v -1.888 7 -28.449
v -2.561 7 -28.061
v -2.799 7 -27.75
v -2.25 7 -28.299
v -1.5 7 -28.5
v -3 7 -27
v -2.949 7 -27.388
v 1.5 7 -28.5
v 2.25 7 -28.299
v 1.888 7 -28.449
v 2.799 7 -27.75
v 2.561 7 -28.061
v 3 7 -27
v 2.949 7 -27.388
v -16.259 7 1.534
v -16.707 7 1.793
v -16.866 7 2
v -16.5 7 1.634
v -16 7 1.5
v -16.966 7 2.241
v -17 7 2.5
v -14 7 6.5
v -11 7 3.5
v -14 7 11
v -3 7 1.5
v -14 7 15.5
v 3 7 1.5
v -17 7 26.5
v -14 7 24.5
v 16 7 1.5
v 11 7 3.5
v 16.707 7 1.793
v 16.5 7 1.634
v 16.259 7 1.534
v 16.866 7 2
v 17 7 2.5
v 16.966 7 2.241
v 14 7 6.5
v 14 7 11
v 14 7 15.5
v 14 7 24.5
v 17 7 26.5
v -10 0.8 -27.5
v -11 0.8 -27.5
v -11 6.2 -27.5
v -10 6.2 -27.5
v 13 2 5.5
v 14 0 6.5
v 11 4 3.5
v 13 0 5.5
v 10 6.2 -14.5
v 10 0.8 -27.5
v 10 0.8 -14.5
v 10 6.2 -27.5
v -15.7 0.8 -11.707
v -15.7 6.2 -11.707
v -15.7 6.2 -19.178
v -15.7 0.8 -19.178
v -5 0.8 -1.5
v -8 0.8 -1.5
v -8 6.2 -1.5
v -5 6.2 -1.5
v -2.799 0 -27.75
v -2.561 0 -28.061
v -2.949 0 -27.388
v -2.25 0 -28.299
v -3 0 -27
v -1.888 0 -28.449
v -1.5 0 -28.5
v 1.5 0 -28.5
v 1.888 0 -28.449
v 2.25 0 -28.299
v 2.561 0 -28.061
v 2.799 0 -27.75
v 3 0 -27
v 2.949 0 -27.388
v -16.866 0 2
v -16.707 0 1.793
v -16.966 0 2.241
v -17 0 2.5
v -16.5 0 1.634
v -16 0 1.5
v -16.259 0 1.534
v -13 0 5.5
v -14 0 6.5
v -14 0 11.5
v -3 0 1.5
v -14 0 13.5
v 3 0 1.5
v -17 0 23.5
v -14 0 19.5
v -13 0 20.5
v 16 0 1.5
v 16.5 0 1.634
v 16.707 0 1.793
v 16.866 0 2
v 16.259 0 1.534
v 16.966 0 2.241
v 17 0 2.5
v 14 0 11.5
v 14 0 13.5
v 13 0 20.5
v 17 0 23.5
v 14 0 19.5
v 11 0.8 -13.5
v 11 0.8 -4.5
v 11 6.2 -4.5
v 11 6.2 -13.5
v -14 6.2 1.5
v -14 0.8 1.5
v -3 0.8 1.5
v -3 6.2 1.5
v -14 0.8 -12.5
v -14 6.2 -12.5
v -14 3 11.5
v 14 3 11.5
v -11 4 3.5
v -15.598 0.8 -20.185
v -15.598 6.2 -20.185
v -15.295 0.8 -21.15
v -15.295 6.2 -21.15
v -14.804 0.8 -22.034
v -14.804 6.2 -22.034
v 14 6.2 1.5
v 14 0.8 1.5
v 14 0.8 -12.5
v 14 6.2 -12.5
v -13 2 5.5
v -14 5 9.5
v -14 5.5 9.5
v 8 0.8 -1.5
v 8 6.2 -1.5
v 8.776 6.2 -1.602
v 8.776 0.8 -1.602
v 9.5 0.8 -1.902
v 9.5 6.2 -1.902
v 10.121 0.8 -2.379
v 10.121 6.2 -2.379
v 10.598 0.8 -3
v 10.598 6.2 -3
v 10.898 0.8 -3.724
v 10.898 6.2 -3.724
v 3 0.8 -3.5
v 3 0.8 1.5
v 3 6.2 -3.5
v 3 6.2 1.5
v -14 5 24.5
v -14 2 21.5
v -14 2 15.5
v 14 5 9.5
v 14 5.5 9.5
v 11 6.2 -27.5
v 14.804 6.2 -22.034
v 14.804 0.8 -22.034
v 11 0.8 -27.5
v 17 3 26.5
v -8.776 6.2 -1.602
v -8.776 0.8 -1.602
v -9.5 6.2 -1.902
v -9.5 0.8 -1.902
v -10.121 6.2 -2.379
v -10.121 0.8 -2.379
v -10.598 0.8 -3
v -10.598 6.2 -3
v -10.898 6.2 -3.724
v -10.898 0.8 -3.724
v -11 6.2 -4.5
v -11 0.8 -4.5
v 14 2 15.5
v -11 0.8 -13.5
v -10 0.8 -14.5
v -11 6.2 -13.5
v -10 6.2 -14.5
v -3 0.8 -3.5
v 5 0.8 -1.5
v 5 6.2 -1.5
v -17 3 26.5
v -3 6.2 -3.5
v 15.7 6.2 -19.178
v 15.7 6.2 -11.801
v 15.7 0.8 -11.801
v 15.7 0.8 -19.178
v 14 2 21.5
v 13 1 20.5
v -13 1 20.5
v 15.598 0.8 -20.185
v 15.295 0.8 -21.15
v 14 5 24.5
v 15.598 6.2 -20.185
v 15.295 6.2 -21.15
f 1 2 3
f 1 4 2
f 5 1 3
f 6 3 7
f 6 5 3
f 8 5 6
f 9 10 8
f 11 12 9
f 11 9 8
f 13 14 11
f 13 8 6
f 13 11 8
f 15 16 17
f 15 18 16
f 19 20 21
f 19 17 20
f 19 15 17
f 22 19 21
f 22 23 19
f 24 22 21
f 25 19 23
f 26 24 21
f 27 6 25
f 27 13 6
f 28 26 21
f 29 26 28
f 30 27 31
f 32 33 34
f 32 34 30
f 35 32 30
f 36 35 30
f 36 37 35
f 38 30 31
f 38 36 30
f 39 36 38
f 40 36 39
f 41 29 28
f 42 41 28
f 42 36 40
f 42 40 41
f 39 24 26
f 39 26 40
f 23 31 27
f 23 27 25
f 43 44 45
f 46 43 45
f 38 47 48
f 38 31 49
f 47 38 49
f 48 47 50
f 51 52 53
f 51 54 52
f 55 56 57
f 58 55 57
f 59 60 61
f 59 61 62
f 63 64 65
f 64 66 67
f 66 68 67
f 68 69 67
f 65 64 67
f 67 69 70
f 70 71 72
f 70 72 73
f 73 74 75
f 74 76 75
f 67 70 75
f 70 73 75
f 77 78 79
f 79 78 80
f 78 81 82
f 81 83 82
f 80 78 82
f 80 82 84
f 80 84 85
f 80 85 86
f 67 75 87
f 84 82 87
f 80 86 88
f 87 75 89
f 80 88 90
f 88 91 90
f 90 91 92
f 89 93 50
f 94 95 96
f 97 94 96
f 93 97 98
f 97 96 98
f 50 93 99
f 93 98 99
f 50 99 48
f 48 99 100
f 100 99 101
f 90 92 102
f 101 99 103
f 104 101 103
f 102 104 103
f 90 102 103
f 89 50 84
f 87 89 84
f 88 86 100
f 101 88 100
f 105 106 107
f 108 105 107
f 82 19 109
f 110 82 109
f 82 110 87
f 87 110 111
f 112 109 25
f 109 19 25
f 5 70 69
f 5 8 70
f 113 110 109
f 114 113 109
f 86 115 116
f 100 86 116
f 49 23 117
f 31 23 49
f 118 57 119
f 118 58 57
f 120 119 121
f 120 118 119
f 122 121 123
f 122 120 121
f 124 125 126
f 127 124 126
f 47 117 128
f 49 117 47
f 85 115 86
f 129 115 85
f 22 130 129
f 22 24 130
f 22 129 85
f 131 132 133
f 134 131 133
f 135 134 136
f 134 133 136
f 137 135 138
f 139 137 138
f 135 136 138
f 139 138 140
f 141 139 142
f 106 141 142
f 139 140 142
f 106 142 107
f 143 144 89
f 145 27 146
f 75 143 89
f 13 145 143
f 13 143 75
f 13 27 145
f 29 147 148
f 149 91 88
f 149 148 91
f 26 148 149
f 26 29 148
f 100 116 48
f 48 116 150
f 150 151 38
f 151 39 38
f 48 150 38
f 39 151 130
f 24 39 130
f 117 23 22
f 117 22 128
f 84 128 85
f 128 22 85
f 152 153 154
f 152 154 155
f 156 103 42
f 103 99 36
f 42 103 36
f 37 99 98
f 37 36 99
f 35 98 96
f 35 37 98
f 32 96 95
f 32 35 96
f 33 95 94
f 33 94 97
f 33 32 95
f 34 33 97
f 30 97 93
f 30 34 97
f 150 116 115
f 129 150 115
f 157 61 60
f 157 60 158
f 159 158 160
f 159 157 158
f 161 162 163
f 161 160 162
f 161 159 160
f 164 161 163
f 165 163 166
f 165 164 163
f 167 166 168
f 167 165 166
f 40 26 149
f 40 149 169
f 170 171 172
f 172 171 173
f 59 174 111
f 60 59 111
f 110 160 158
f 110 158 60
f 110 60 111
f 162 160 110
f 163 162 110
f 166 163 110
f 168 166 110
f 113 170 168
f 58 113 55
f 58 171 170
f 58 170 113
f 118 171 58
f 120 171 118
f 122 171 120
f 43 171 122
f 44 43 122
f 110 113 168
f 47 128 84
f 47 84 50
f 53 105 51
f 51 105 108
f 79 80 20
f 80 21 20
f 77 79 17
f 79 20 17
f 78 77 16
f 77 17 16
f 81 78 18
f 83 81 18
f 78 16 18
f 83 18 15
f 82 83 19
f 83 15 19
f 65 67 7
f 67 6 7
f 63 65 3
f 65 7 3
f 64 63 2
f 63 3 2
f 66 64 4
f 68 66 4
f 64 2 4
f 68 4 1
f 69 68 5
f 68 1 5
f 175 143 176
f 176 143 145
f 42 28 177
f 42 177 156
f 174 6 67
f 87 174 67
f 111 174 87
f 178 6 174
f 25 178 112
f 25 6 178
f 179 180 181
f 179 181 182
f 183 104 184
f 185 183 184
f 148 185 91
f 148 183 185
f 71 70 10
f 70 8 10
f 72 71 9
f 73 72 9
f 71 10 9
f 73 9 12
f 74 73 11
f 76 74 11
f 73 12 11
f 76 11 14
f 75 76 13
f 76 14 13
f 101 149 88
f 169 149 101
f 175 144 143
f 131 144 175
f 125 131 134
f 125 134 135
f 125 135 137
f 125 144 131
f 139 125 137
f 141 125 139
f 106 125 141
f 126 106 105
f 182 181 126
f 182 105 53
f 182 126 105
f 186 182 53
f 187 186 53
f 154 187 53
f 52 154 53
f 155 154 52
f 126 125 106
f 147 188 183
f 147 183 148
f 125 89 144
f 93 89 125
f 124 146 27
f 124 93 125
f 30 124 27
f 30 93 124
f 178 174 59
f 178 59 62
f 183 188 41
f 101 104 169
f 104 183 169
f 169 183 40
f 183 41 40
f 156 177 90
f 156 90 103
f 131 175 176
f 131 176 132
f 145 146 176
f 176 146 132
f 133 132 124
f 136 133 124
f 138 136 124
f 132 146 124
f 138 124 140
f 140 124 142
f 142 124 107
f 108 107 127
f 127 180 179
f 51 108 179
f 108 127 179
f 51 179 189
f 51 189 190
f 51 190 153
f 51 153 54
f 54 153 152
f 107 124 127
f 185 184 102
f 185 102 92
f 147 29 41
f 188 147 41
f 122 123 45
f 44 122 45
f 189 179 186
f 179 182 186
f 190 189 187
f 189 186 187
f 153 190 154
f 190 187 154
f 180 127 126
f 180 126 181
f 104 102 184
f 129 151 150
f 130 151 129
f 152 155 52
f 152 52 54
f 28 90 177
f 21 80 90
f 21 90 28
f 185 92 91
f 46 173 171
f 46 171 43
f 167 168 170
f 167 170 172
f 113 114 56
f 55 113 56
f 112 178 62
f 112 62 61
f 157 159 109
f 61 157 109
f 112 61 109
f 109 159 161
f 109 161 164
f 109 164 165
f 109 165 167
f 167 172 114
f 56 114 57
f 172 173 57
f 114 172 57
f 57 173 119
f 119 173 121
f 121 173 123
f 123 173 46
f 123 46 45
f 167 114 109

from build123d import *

# Parameters (mm, degrees)
SKETCH1_W            = 28
SKETCH1_H            = 3
BOSS_EXTRUDE1_DEPTH  = 7
SKETCH2_W            = 3
SKETCH2_H            = 7
BOSS_EXTRUDE2_DEPTH  = 26
SKETCH3_W            = 6
SKETCH3_H            = 7
BOSS_EXTRUDE3_DEPTH  = 27
BOSS_EXTRUDE4_DEPTH  = 7
CHAMFER1_SIZE        = 2
FILLET1_R            = 3
CUT_EXTRUDE1_DEPTH   = 8
SKETCH6_W            = 34
SKETCH6_H            = 7
BOSS_EXTRUDE5_DEPTH  = 25
SKETCH8_W            = 28
SKETCH8_H            = 21
CUT_EXTRUDE2_DEPTH   = 25
CHAMFER2_SIZE        = 3
FILLET2_R            = 1
SKETCH9_W            = 28
SKETCH9_H            = 4
BOSS_EXTRUDE6_DEPTH  = 7
SKETCH10_W           = 28
SKETCH10_H           = 2
BOSS_EXTRUDE7_DEPTH  = 4
CHAMFER3_SIZE        = 1
CHAMFER4_SIZE        = 3
CHAMFER5_SIZE        = 2
FILLET4_R            = 1.5
SKETCH11_W           = 14
SKETCH11_H           = 7
BOSS_EXTRUDE8_DEPTH  = 1
CHAMFER6_SIZE        = 1
SKETCH12_W           = 14
SKETCH12_H           = 7
BOSS_EXTRUDE9_DEPTH  = 1
CHAMFER7_SIZE        = 1
SKETCH13_W           = 30
SKETCH13_H           = 0.8
CUT_EXTRUDE3_DEPTH   = 12.7
SKETCH14_W           = 30
SKETCH14_H           = 0.8
CUT_EXTRUDE4_DEPTH   = 12.7
BOSS_EXTRUDE10_DEPTH = 5.4
FILLET5_R            = 5
CHAMFER8_SIZE        = 3
SKETCH16_W           = 28
SKETCH16_H           = 2
BOSS_EXTRUDE11_DEPTH = 2
CHAMFER9_SIZE        = 2
SKETCH17_W           = 30.68644474
SKETCH17_H           = 2
BOSS_EXTRUDE12_DEPTH = 2
CHAMFER10_SIZE       = 2
CHAMFER11_SIZE       = 1.5
CHAMFER12_SIZE       = 1


with BuildPart() as part:
    # Sketch1 → Boss-Extrude1 (new body)
    with BuildSketch(Plane(origin=(0, 0, 0), x_dir=(1, 0, 0), z_dir=(0, 1, 0))):
        Rectangle(SKETCH1_W, SKETCH1_H)
    extrude(amount=BOSS_EXTRUDE1_DEPTH)

    # Sketch2 → Boss-Extrude2 (add)
    with BuildSketch(Plane(origin=(0, 0, -1.5), x_dir=(-1, 0, 0), z_dir=(0, 0, -1))):
        with Locations((12.5, 3.5)):
            Rectangle(SKETCH2_W, SKETCH2_H)
        with Locations((-12.5, 3.5)):
            Rectangle(SKETCH2_W, SKETCH2_H)
    extrude(amount=BOSS_EXTRUDE2_DEPTH)

    # Sketch3 → Boss-Extrude3 (add)
    with BuildSketch(Plane(origin=(0, 0, -1.5), x_dir=(-1, 0, 0), z_dir=(0, 0, -1))):
        with Locations((0, 3.5)):
            Rectangle(SKETCH3_W, SKETCH3_H)
    extrude(amount=BOSS_EXTRUDE3_DEPTH)

    # Sketch4 → Boss-Extrude4 (add)
    with BuildSketch(Plane(origin=(0, 7, 0), x_dir=(1, 0, 0), z_dir=(0, 1, 0))):
        Polygon((-14, 12.5), (-15.7, 11.707276981), (-15.7, 16.707276981), (-14, 19.5), align=None)
        Polygon((14, 12.5), (15.7, 11.800538513), (15.7, 16.800538513), (14, 19.5), align=None)
    extrude(amount=-BOSS_EXTRUDE4_DEPTH)

    # Chamfer1
    chamfer1_edges = [part.edges().sort_by_distance(p)[0] for p in [
        (3, 3.5, -1.5),
        (-3, 3.5, -1.5),
    ]]
    chamfer(chamfer1_edges, length=CHAMFER1_SIZE)

    # Fillet1
    fillet1_edges = [part.edges().sort_by_distance(p)[0] for p in [
        (-11, 3.5, -1.5),
        (11, 3.5, -1.5),
    ]]
    fillet(fillet1_edges, radius=FILLET1_R)

    # Sketch5 → Cut-Extrude1 (cut)
    with BuildSketch(Plane(origin=(0, 7, 0), x_dir=(1, 0, 0), z_dir=(0, 1, 0))):
        Polygon((-14, 21.5), (-11, 27.5), (-14, 27.5), align=None)
        Polygon((14, 21.5), (11, 27.5), (14, 27.5), align=None)
    extrude(amount=-CUT_EXTRUDE1_DEPTH, mode=Mode.SUBTRACT)

    # Sketch6 → Boss-Extrude5 (add)
    with BuildSketch(Plane.XY.offset(1.5)):
        with Locations((0, 3.5)):
            Rectangle(SKETCH6_W, SKETCH6_H)
    extrude(amount=BOSS_EXTRUDE5_DEPTH)

    # Sketch8 → Cut-Extrude2 (cut)
    with BuildSketch(Plane(origin=(0, 7, 0), x_dir=(1, 0, 0), z_dir=(0, 1, 0))):
        with Locations((0, -14)):
            Rectangle(SKETCH8_W, SKETCH8_H)
    extrude(amount=-CUT_EXTRUDE2_DEPTH, mode=Mode.SUBTRACT)

    # Chamfer2
    chamfer2_edges = [part.edges().sort_by_distance(p)[0] for p in [
        (-14, 3.5, 3.5),
        (14, 3.5, 3.5),
    ]]
    chamfer(chamfer2_edges, length=CHAMFER2_SIZE)

    # Fillet2
    fillet2_edges = [part.edges().sort_by_distance(p)[0] for p in [
        (-17, 3.5, 1.5),
        (17, 3.5, 1.5),
    ]]
    fillet(fillet2_edges, radius=FILLET2_R)

    # Sketch9 → Boss-Extrude6 (add)
    with BuildSketch(Plane(origin=(0, 7, 0), x_dir=(1, 0, 0), z_dir=(0, 1, 0))):
        with Locations((0, -13.5)):
            Rectangle(SKETCH9_W, SKETCH9_H)
    extrude(amount=-BOSS_EXTRUDE6_DEPTH)

    # Sketch10 → Boss-Extrude7 (add)
    with BuildSketch(Plane(origin=(0, 0, 24.5), x_dir=(-1, 0, 0), z_dir=(0, 0, -1))):
        with Locations((0, 1)):
            Rectangle(SKETCH10_W, SKETCH10_H)
    extrude(amount=BOSS_EXTRUDE7_DEPTH)

    # Chamfer3
    chamfer3_edges = [part.edges().sort_by_distance(p)[0] for p in [
        (0, 2, 20.5),
    ]]
    chamfer(chamfer3_edges, length=CHAMFER3_SIZE)

    # Chamfer4
    chamfer4_edges = [part.edges().sort_by_distance(p)[0] for p in [
        (0, 2, 24.5),
    ]]
    chamfer(chamfer4_edges, length=CHAMFER4_SIZE - 0.0001)  # a hair under: the kernel refuses the full size

    # Chamfer5
    chamfer5_edges = [part.edges().sort_by_distance(p)[0] for p in [
        (0, 0, 15.5),
    ]]
    chamfer(chamfer5_edges, length=CHAMFER5_SIZE)

    # Fillet4
    fillet4_edges = [part.edges().sort_by_distance(p)[0] for p in [
        (3, 3.5, -28.5),
        (-3, 3.5, -28.5),
    ]]
    fillet(fillet4_edges, radius=FILLET4_R)

    # Sketch11 → Boss-Extrude8 (add)
    with BuildSketch(Plane(origin=(-11, 0, 0), x_dir=(0, 0, -1), z_dir=(1, 0, 0))):
        with Locations((20.5, 3.5)):
            Rectangle(SKETCH11_W, SKETCH11_H)
    extrude(amount=BOSS_EXTRUDE8_DEPTH)

    # Chamfer6
    chamfer6_edges = [part.edges().sort_by_distance(p)[0] for p in [
        (-10, 3.5, -13.5),
    ]]
    chamfer(chamfer6_edges, length=CHAMFER6_SIZE - 0.0001)  # a hair under: the kernel refuses the full size

    # Sketch12 → Boss-Extrude9 (add)
    with BuildSketch(Plane.ZY.offset(-11)):
        with Locations((-20.5, 3.5)):
            Rectangle(SKETCH12_W, SKETCH12_H)
    extrude(amount=BOSS_EXTRUDE9_DEPTH)

    # Chamfer7
    chamfer7_edges = [part.edges().sort_by_distance(p)[0] for p in [
        (10, 3.5, -13.5),
    ]]
    chamfer(chamfer7_edges, length=CHAMFER7_SIZE - 0.0001)  # a hair under: the kernel refuses the full size

    # Sketch13 → Cut-Extrude3 (cut)
    with BuildSketch(Plane(origin=(15.7, 0, 0), x_dir=(0, 0, -1), z_dir=(1, 0, 0))):
        with Locations((13.5, 6.6)):
            Rectangle(SKETCH13_W, SKETCH13_H)
        with Locations((13.5, 0.4)):
            Rectangle(SKETCH13_W, SKETCH13_H)
    extrude(amount=-CUT_EXTRUDE3_DEPTH, mode=Mode.SUBTRACT)

    # Sketch14 → Cut-Extrude4 (cut)
    with BuildSketch(Plane.ZY.offset(15.7)):
        with Locations((-13.5, 6.6)):
            Rectangle(SKETCH14_W, SKETCH14_H)
        with Locations((-13.5, 0.4)):
            Rectangle(SKETCH14_W, SKETCH14_H)
    extrude(amount=-CUT_EXTRUDE4_DEPTH, mode=Mode.SUBTRACT)

    # Sketch15 → Boss-Extrude10 (add)
    with BuildSketch(Plane(origin=(0, 6.2, 0), x_dir=(1, 0, 0), z_dir=(0, 1, 0))):
        Polygon((-15.7, 16.707276981), (-15.7, 20.746872846), (-11, 27.5), (-14, 19.5), align=None)
        Polygon((15.7, 16.800538513), (15.7, 20.746872846), (11, 27.5), (14, 19.5), align=None)
    extrude(amount=-BOSS_EXTRUDE10_DEPTH)

    # Fillet5
    fillet5_edges = [part.edges().sort_by_distance(p)[0] for p in [
        (-15.7, 3.5, -20.746872846),
        (15.7, 3.5, -20.746872846),
    ]]
    fillet(fillet5_edges, radius=FILLET5_R)

    # Chamfer8
    chamfer8_edges = [part.edges().sort_by_distance(p)[0] for p in [
        (0, 0, 26.5),
    ]]
    chamfer(chamfer8_edges, length=CHAMFER8_SIZE)

    # Sketch16 → Boss-Extrude11 (add)
    with BuildSketch(Plane(origin=(0, 0, 11.5), x_dir=(-1, 0, 0), z_dir=(0, 0, -1))):
        with Locations((0, 6)):
            Rectangle(SKETCH16_W, SKETCH16_H)
    extrude(amount=BOSS_EXTRUDE11_DEPTH)

    # Chamfer9
    chamfer9_edges = [part.edges().sort_by_distance(p)[0] for p in [
        (0, 5, 11.5),
    ]]
    chamfer(chamfer9_edges, length=CHAMFER9_SIZE - 0.0001)  # a hair under: the kernel refuses the full size

    # Sketch17 → Boss-Extrude12 (add)
    with BuildSketch(Plane.XY.offset(3.5)):
        with Locations((0.267537513, 1)):
            Rectangle(SKETCH17_W, SKETCH17_H)
    extrude(amount=BOSS_EXTRUDE12_DEPTH)

    # Chamfer10
    chamfer10_edges = [part.edges().sort_by_distance(p)[0] for p in [
        (0, 2, 3.5),
    ]]
    chamfer(chamfer10_edges, length=CHAMFER10_SIZE - 0.0001)  # a hair under: the kernel refuses the full size

    # Chamfer11
    chamfer11_edges = [part.edges().sort_by_distance(p)[0] for p in [
        (0, 7, 9.5),
    ]]
    chamfer(chamfer11_edges, length=CHAMFER11_SIZE)

    # Chamfer12
    chamfer12_edges = [part.edges().sort_by_distance(p)[0] for p in [
        (-14, 0.5, 20.5),
        (14, 0.5, 20.5),
    ]]
    chamfer(chamfer12_edges, length=CHAMFER12_SIZE - 0.0001)  # a hair under: the kernel refuses the full size


solid = part.part
